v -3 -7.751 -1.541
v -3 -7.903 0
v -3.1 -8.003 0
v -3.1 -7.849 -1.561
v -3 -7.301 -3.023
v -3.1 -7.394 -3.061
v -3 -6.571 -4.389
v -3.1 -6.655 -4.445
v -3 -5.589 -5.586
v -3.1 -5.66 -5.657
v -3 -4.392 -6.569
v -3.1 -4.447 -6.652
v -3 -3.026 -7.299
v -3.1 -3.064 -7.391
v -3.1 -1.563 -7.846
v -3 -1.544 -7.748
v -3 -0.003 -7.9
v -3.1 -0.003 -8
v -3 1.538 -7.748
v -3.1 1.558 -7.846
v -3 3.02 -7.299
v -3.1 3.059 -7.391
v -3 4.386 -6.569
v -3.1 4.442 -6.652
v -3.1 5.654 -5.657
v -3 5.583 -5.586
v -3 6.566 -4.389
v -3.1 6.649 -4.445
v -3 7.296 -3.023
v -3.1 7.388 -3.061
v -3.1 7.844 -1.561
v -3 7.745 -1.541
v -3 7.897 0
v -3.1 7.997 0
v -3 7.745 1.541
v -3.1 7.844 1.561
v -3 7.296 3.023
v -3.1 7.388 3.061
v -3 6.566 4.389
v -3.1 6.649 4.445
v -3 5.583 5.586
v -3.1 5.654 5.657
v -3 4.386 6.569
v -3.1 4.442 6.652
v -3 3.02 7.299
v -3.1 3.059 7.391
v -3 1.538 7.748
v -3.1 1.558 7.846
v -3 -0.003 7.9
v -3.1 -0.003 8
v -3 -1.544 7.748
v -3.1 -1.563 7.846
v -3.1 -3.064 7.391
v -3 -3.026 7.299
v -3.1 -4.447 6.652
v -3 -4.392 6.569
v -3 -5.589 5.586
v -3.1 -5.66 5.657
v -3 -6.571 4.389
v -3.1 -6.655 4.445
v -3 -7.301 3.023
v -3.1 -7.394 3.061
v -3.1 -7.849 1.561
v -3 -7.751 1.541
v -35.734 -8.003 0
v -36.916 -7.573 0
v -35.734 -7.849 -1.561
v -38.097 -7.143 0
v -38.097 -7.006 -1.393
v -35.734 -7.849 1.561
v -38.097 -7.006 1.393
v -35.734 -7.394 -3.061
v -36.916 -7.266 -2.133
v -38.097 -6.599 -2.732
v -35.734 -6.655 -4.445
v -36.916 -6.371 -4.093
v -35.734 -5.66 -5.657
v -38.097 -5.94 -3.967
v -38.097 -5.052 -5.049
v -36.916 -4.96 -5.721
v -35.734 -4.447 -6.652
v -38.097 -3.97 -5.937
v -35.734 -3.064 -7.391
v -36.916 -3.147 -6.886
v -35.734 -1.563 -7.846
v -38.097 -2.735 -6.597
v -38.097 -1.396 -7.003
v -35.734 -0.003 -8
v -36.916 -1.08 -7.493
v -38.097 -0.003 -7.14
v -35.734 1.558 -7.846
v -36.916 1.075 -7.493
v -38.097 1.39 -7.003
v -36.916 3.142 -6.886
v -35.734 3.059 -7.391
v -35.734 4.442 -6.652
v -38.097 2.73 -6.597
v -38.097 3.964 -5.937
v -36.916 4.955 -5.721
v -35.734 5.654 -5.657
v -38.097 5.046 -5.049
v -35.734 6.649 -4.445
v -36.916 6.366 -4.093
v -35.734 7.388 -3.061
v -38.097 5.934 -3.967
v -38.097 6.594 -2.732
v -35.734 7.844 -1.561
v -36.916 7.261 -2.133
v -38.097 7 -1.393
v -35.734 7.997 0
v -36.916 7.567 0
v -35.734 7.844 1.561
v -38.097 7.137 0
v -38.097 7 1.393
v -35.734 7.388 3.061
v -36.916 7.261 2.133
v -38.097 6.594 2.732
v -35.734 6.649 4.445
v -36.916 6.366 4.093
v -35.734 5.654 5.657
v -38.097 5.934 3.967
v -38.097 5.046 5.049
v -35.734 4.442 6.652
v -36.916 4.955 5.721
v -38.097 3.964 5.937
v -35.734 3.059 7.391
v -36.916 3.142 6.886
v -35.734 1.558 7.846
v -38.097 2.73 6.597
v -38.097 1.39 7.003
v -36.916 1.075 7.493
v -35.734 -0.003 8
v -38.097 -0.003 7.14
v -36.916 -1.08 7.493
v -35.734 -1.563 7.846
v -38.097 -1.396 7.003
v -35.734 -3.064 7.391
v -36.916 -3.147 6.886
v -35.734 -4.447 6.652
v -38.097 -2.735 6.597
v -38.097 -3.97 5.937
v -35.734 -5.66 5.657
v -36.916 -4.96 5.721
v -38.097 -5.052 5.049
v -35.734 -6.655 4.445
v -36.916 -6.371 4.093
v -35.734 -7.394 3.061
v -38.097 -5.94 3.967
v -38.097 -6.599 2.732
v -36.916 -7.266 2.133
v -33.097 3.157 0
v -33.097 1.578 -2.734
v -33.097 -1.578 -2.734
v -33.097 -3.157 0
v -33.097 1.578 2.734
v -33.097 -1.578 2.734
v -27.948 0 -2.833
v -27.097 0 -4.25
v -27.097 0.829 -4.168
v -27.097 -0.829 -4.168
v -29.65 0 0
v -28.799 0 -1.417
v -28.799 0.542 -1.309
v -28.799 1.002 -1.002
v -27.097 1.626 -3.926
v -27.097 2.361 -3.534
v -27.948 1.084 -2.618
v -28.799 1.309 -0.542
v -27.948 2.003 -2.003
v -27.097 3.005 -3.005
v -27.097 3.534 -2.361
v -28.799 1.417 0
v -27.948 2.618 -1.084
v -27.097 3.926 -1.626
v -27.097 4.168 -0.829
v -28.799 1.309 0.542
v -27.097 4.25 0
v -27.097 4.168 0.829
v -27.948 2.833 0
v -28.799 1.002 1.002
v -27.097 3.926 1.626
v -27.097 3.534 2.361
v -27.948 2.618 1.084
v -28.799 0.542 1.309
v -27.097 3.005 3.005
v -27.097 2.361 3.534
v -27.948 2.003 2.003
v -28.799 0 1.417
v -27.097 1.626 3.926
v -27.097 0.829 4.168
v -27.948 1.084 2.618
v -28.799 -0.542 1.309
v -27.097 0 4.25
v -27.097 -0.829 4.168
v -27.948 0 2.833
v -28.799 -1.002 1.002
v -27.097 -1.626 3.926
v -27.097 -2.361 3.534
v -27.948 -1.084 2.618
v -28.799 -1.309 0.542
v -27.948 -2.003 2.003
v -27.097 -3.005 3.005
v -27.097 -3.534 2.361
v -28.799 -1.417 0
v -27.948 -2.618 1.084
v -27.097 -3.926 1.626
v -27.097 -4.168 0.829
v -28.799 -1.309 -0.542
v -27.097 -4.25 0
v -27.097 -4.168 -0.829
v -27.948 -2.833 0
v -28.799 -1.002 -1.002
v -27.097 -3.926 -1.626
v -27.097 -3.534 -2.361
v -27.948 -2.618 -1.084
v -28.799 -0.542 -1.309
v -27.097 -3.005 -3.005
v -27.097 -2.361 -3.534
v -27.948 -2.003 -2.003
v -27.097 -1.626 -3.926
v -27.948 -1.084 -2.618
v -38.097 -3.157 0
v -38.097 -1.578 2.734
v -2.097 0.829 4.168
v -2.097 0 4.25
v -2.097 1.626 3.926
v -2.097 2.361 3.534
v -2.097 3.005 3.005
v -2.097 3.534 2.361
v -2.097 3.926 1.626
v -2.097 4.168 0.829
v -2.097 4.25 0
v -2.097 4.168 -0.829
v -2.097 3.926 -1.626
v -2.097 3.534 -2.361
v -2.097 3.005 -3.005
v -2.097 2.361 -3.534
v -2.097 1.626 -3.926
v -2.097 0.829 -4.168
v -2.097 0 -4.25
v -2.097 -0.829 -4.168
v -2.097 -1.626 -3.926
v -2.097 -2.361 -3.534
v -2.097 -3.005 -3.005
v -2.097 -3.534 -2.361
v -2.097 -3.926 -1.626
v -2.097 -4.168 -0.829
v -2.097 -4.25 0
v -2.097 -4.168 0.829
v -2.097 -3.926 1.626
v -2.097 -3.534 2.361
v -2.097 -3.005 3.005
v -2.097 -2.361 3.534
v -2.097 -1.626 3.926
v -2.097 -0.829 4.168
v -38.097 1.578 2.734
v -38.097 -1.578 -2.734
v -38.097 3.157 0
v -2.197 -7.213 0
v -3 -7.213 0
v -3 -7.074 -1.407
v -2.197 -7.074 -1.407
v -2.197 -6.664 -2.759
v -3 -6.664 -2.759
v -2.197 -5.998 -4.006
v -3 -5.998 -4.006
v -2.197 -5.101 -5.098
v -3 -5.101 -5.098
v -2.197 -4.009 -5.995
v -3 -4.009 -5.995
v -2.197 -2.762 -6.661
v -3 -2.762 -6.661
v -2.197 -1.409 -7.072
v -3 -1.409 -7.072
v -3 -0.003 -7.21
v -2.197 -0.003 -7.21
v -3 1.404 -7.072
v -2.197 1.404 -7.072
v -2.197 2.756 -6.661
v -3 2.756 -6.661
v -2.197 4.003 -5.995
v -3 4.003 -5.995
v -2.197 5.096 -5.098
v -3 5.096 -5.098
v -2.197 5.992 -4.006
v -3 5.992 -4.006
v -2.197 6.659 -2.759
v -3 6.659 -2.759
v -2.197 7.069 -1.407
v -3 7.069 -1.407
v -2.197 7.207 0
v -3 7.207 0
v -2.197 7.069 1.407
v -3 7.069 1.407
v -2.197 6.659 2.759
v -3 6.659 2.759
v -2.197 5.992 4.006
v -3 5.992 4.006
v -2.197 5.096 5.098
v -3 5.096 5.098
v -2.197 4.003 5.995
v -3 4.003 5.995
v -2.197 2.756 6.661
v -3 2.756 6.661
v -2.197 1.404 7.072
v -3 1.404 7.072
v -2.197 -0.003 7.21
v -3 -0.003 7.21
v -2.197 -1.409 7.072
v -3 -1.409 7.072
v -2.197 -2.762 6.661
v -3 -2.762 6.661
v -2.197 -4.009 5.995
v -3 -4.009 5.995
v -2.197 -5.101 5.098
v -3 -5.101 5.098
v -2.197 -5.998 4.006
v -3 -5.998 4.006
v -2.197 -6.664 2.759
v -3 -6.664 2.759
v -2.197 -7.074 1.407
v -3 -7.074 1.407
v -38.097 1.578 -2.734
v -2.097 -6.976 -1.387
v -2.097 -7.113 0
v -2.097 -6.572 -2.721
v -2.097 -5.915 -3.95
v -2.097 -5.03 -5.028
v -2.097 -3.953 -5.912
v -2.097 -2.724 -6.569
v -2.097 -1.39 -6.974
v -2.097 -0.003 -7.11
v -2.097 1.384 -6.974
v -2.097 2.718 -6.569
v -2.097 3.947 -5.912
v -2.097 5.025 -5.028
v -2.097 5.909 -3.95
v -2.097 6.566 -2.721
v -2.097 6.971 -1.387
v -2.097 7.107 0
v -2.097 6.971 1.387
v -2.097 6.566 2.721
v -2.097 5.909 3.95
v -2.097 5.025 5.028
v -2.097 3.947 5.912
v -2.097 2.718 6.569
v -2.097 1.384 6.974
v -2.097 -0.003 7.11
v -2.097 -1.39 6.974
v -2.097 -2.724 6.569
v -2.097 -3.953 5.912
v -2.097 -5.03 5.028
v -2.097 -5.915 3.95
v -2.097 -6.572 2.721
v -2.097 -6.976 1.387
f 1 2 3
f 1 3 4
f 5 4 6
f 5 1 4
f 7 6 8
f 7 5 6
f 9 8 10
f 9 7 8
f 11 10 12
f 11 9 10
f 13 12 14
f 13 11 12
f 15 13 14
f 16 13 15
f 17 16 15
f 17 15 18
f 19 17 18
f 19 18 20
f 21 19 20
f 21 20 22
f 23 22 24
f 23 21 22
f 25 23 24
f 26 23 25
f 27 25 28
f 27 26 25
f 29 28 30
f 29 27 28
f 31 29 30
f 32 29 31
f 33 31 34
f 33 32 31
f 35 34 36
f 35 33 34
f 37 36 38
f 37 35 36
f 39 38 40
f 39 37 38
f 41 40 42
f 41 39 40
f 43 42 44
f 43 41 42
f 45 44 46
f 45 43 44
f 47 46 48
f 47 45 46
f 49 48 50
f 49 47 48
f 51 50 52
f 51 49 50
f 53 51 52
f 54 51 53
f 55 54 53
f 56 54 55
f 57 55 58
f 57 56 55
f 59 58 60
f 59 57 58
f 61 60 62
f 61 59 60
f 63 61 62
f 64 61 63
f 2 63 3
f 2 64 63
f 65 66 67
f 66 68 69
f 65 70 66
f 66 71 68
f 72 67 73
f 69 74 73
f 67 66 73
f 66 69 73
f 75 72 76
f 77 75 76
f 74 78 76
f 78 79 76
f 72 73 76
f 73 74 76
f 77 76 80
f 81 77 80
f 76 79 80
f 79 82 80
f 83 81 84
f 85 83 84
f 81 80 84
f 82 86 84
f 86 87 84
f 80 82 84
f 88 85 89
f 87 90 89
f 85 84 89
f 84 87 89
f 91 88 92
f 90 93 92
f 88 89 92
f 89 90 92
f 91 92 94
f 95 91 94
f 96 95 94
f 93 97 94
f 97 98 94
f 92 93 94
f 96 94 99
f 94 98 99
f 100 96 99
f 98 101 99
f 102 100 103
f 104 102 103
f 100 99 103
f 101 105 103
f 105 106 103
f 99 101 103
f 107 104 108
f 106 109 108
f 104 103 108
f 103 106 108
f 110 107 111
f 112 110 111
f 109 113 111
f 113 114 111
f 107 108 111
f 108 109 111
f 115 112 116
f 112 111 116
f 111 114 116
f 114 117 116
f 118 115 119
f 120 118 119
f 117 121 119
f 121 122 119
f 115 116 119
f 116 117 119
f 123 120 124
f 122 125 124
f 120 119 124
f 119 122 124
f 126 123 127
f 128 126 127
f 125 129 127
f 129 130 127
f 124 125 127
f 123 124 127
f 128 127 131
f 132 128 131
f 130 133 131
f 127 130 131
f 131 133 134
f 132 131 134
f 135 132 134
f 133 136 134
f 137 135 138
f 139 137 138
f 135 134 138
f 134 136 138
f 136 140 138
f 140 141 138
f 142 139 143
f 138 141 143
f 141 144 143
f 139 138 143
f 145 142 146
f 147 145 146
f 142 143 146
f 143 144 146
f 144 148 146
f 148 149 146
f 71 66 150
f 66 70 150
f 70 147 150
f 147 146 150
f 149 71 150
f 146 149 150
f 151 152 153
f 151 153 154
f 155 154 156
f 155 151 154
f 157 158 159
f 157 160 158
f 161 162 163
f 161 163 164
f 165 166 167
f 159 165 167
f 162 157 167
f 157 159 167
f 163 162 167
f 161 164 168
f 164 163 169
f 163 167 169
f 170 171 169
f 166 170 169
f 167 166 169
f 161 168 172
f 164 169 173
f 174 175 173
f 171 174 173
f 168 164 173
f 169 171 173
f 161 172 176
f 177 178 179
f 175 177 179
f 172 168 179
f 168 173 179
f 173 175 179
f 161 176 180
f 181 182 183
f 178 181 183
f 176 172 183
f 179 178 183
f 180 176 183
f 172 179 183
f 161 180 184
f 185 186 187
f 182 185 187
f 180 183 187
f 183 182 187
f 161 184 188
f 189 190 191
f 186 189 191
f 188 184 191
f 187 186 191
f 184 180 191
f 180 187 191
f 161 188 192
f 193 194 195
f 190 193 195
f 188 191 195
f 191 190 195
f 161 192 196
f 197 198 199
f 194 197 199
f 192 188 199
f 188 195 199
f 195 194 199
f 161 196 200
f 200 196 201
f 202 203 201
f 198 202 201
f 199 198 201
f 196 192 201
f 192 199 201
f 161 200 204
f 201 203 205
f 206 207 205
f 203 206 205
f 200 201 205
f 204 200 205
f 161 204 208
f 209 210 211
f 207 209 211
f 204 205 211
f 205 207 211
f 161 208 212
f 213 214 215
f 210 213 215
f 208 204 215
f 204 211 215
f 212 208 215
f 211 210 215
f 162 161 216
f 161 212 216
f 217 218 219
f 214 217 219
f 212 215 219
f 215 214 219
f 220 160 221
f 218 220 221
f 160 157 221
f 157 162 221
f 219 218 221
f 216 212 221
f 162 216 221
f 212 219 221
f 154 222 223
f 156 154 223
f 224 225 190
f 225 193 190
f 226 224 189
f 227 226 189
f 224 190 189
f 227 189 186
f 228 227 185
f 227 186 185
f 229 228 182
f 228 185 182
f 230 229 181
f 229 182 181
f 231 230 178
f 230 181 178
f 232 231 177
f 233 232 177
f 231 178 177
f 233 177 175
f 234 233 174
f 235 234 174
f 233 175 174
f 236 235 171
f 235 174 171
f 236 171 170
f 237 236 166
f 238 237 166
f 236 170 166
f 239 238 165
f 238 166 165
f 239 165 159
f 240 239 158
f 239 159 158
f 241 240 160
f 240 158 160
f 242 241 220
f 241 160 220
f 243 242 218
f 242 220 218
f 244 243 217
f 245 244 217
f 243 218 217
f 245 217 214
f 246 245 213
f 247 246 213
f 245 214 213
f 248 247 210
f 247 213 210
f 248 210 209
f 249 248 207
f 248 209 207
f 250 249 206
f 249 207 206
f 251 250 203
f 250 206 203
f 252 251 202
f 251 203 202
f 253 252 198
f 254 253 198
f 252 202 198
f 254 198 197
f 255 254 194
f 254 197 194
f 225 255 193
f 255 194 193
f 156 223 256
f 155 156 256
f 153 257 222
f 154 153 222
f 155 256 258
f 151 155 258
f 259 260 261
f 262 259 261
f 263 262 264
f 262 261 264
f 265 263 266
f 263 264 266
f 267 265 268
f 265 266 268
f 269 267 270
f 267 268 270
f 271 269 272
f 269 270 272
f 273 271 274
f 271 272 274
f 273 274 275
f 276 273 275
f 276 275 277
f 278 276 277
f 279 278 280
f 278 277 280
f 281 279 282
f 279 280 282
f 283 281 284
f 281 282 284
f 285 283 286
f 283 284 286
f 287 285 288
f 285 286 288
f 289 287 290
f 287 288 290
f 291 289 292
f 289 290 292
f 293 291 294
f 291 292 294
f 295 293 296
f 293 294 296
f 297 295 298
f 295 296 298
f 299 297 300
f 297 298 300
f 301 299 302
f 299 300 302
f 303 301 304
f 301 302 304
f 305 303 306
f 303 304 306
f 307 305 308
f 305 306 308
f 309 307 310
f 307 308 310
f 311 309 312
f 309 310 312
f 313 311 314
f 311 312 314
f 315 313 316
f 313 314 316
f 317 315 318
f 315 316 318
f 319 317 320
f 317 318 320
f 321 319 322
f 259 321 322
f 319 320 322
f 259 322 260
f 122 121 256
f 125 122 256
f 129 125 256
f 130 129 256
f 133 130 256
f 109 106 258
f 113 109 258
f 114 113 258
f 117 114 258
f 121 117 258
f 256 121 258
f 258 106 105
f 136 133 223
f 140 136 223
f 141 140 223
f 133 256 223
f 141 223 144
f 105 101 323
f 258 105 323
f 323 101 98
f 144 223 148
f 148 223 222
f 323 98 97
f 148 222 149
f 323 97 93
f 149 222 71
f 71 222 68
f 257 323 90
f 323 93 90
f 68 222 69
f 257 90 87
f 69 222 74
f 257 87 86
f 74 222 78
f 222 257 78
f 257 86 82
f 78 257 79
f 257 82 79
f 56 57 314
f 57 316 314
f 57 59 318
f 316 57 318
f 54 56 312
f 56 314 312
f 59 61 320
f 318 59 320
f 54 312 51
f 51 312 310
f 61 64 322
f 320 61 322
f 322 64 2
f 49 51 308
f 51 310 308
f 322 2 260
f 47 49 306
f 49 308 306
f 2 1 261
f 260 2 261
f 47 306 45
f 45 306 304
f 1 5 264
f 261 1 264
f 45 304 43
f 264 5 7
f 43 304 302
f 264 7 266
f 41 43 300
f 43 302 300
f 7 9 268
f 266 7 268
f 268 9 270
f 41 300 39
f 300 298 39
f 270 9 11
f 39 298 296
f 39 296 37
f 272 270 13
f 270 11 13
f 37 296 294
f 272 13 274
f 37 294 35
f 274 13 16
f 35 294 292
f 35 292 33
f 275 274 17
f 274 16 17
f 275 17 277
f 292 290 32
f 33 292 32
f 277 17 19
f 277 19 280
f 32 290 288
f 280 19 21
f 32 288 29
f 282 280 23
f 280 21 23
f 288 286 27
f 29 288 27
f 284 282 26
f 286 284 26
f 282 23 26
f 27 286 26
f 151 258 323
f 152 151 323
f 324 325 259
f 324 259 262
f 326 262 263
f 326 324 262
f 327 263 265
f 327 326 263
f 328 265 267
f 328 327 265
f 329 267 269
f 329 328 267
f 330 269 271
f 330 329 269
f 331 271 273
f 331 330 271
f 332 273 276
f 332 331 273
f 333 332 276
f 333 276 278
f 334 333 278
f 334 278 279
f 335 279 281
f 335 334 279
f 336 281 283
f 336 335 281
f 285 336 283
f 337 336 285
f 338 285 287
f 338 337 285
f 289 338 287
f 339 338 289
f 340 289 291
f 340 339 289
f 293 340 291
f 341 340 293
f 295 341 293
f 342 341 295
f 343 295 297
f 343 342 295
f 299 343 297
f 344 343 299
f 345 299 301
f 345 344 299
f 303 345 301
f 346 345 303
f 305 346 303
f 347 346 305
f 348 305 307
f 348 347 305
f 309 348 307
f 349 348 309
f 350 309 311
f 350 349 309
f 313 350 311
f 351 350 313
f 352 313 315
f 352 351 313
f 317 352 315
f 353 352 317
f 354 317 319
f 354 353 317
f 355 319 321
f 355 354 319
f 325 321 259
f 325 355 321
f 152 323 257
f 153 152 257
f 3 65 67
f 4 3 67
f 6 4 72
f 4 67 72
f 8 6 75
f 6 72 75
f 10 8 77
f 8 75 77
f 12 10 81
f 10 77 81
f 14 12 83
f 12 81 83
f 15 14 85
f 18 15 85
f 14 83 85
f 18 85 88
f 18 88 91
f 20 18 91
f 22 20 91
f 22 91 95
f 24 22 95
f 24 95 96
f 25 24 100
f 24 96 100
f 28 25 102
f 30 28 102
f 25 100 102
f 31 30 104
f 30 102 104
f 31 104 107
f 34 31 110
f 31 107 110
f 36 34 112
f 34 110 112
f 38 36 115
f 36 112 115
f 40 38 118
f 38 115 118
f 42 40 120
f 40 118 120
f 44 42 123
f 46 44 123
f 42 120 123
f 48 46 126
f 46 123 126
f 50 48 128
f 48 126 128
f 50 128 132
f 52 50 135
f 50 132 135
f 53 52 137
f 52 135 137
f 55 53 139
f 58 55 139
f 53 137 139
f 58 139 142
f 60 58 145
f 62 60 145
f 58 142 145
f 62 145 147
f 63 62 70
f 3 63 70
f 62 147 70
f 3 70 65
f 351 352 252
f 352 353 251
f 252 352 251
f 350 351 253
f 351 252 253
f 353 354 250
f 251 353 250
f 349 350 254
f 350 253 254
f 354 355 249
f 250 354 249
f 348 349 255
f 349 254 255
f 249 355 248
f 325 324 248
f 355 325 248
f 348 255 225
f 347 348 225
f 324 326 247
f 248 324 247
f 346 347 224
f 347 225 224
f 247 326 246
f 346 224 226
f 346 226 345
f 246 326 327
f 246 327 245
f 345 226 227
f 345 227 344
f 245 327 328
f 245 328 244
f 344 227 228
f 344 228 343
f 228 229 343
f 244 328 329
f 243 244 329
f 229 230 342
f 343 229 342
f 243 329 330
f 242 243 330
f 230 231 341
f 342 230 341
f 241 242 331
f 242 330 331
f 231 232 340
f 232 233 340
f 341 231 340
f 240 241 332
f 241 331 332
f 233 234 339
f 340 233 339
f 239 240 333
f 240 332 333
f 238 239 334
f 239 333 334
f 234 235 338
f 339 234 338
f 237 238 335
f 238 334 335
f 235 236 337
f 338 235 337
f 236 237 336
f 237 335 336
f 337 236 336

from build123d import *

# Parameters (mm, degrees)
CORTAR_EXTRUIR1_DEPTH      = 5
CHAFL_N1_SIZE              = 0.1
TALADRO_ROSCADO_M101_D     = 8.5
TALADRO_ROSCADO_M101_DEPTH = 25
TALADRO_ROSCADO_M101_TIP   = 2.553657631


with BuildPart() as part:
    # Sketch1 → Revolve1 (revolve)
    with BuildSketch(Plane.XY, mode=Mode.PRIVATE) as revolve1_sk:
        Polygon((-3, 7.99722512), (-35.734329665, 7.99722512), (-38.096725725, 7.137383273), (-38.096725725, -0.00277488), (-2.096725725, -0.00277488), (-2.096725725, 7.2074675), (-3, 7.2074675), align=None)
    revolve(revolve1_sk.sketch.rotate(Axis((-38.096725725, -0.00277488, 0), (1, 0, 0)), 180), axis=Axis((-38.096725725, -0.00277488, 0), (1, 0, 0)))

    # Croquis3 → Cortar-Extruir1 (cut)
    with BuildSketch(Plane.ZY.offset(38.096725725)):
        Polygon((0, -3.156760752), (2.733835005, -1.578380376), (2.733835005, 1.578380376), (0, 3.156760752), (-2.733835005, 1.578380376), (-2.733835005, -1.578380376), align=None)
    extrude(amount=-CORTAR_EXTRUIR1_DEPTH, mode=Mode.SUBTRACT)

    # Chaflán1
    chafl_n1_edges = [part.edges().sort_by_distance(p)[0] for p in [
        (-2.096725725, 7.2074675, 0),
        (-3, 7.99722512, 0),
    ]]
    chamfer(chafl_n1_edges, length=CHAFL_N1_SIZE)

    # Taladro roscado M101
    with Locations(Plane(origin=(-2.096725725, 0, 0), x_dir=(0, 0, -1), z_dir=(1, 0, 0))):
        with Locations((0, 0)):
            Hole(TALADRO_ROSCADO_M101_D / 2, depth=TALADRO_ROSCADO_M101_DEPTH)
            with Locations((0, 0, -(TALADRO_ROSCADO_M101_DEPTH + TALADRO_ROSCADO_M101_TIP / 2))):  # 118° drill point
                Cone(0, TALADRO_ROSCADO_M101_D / 2, TALADRO_ROSCADO_M101_TIP, mode=Mode.SUBTRACT)


solid = part.part
